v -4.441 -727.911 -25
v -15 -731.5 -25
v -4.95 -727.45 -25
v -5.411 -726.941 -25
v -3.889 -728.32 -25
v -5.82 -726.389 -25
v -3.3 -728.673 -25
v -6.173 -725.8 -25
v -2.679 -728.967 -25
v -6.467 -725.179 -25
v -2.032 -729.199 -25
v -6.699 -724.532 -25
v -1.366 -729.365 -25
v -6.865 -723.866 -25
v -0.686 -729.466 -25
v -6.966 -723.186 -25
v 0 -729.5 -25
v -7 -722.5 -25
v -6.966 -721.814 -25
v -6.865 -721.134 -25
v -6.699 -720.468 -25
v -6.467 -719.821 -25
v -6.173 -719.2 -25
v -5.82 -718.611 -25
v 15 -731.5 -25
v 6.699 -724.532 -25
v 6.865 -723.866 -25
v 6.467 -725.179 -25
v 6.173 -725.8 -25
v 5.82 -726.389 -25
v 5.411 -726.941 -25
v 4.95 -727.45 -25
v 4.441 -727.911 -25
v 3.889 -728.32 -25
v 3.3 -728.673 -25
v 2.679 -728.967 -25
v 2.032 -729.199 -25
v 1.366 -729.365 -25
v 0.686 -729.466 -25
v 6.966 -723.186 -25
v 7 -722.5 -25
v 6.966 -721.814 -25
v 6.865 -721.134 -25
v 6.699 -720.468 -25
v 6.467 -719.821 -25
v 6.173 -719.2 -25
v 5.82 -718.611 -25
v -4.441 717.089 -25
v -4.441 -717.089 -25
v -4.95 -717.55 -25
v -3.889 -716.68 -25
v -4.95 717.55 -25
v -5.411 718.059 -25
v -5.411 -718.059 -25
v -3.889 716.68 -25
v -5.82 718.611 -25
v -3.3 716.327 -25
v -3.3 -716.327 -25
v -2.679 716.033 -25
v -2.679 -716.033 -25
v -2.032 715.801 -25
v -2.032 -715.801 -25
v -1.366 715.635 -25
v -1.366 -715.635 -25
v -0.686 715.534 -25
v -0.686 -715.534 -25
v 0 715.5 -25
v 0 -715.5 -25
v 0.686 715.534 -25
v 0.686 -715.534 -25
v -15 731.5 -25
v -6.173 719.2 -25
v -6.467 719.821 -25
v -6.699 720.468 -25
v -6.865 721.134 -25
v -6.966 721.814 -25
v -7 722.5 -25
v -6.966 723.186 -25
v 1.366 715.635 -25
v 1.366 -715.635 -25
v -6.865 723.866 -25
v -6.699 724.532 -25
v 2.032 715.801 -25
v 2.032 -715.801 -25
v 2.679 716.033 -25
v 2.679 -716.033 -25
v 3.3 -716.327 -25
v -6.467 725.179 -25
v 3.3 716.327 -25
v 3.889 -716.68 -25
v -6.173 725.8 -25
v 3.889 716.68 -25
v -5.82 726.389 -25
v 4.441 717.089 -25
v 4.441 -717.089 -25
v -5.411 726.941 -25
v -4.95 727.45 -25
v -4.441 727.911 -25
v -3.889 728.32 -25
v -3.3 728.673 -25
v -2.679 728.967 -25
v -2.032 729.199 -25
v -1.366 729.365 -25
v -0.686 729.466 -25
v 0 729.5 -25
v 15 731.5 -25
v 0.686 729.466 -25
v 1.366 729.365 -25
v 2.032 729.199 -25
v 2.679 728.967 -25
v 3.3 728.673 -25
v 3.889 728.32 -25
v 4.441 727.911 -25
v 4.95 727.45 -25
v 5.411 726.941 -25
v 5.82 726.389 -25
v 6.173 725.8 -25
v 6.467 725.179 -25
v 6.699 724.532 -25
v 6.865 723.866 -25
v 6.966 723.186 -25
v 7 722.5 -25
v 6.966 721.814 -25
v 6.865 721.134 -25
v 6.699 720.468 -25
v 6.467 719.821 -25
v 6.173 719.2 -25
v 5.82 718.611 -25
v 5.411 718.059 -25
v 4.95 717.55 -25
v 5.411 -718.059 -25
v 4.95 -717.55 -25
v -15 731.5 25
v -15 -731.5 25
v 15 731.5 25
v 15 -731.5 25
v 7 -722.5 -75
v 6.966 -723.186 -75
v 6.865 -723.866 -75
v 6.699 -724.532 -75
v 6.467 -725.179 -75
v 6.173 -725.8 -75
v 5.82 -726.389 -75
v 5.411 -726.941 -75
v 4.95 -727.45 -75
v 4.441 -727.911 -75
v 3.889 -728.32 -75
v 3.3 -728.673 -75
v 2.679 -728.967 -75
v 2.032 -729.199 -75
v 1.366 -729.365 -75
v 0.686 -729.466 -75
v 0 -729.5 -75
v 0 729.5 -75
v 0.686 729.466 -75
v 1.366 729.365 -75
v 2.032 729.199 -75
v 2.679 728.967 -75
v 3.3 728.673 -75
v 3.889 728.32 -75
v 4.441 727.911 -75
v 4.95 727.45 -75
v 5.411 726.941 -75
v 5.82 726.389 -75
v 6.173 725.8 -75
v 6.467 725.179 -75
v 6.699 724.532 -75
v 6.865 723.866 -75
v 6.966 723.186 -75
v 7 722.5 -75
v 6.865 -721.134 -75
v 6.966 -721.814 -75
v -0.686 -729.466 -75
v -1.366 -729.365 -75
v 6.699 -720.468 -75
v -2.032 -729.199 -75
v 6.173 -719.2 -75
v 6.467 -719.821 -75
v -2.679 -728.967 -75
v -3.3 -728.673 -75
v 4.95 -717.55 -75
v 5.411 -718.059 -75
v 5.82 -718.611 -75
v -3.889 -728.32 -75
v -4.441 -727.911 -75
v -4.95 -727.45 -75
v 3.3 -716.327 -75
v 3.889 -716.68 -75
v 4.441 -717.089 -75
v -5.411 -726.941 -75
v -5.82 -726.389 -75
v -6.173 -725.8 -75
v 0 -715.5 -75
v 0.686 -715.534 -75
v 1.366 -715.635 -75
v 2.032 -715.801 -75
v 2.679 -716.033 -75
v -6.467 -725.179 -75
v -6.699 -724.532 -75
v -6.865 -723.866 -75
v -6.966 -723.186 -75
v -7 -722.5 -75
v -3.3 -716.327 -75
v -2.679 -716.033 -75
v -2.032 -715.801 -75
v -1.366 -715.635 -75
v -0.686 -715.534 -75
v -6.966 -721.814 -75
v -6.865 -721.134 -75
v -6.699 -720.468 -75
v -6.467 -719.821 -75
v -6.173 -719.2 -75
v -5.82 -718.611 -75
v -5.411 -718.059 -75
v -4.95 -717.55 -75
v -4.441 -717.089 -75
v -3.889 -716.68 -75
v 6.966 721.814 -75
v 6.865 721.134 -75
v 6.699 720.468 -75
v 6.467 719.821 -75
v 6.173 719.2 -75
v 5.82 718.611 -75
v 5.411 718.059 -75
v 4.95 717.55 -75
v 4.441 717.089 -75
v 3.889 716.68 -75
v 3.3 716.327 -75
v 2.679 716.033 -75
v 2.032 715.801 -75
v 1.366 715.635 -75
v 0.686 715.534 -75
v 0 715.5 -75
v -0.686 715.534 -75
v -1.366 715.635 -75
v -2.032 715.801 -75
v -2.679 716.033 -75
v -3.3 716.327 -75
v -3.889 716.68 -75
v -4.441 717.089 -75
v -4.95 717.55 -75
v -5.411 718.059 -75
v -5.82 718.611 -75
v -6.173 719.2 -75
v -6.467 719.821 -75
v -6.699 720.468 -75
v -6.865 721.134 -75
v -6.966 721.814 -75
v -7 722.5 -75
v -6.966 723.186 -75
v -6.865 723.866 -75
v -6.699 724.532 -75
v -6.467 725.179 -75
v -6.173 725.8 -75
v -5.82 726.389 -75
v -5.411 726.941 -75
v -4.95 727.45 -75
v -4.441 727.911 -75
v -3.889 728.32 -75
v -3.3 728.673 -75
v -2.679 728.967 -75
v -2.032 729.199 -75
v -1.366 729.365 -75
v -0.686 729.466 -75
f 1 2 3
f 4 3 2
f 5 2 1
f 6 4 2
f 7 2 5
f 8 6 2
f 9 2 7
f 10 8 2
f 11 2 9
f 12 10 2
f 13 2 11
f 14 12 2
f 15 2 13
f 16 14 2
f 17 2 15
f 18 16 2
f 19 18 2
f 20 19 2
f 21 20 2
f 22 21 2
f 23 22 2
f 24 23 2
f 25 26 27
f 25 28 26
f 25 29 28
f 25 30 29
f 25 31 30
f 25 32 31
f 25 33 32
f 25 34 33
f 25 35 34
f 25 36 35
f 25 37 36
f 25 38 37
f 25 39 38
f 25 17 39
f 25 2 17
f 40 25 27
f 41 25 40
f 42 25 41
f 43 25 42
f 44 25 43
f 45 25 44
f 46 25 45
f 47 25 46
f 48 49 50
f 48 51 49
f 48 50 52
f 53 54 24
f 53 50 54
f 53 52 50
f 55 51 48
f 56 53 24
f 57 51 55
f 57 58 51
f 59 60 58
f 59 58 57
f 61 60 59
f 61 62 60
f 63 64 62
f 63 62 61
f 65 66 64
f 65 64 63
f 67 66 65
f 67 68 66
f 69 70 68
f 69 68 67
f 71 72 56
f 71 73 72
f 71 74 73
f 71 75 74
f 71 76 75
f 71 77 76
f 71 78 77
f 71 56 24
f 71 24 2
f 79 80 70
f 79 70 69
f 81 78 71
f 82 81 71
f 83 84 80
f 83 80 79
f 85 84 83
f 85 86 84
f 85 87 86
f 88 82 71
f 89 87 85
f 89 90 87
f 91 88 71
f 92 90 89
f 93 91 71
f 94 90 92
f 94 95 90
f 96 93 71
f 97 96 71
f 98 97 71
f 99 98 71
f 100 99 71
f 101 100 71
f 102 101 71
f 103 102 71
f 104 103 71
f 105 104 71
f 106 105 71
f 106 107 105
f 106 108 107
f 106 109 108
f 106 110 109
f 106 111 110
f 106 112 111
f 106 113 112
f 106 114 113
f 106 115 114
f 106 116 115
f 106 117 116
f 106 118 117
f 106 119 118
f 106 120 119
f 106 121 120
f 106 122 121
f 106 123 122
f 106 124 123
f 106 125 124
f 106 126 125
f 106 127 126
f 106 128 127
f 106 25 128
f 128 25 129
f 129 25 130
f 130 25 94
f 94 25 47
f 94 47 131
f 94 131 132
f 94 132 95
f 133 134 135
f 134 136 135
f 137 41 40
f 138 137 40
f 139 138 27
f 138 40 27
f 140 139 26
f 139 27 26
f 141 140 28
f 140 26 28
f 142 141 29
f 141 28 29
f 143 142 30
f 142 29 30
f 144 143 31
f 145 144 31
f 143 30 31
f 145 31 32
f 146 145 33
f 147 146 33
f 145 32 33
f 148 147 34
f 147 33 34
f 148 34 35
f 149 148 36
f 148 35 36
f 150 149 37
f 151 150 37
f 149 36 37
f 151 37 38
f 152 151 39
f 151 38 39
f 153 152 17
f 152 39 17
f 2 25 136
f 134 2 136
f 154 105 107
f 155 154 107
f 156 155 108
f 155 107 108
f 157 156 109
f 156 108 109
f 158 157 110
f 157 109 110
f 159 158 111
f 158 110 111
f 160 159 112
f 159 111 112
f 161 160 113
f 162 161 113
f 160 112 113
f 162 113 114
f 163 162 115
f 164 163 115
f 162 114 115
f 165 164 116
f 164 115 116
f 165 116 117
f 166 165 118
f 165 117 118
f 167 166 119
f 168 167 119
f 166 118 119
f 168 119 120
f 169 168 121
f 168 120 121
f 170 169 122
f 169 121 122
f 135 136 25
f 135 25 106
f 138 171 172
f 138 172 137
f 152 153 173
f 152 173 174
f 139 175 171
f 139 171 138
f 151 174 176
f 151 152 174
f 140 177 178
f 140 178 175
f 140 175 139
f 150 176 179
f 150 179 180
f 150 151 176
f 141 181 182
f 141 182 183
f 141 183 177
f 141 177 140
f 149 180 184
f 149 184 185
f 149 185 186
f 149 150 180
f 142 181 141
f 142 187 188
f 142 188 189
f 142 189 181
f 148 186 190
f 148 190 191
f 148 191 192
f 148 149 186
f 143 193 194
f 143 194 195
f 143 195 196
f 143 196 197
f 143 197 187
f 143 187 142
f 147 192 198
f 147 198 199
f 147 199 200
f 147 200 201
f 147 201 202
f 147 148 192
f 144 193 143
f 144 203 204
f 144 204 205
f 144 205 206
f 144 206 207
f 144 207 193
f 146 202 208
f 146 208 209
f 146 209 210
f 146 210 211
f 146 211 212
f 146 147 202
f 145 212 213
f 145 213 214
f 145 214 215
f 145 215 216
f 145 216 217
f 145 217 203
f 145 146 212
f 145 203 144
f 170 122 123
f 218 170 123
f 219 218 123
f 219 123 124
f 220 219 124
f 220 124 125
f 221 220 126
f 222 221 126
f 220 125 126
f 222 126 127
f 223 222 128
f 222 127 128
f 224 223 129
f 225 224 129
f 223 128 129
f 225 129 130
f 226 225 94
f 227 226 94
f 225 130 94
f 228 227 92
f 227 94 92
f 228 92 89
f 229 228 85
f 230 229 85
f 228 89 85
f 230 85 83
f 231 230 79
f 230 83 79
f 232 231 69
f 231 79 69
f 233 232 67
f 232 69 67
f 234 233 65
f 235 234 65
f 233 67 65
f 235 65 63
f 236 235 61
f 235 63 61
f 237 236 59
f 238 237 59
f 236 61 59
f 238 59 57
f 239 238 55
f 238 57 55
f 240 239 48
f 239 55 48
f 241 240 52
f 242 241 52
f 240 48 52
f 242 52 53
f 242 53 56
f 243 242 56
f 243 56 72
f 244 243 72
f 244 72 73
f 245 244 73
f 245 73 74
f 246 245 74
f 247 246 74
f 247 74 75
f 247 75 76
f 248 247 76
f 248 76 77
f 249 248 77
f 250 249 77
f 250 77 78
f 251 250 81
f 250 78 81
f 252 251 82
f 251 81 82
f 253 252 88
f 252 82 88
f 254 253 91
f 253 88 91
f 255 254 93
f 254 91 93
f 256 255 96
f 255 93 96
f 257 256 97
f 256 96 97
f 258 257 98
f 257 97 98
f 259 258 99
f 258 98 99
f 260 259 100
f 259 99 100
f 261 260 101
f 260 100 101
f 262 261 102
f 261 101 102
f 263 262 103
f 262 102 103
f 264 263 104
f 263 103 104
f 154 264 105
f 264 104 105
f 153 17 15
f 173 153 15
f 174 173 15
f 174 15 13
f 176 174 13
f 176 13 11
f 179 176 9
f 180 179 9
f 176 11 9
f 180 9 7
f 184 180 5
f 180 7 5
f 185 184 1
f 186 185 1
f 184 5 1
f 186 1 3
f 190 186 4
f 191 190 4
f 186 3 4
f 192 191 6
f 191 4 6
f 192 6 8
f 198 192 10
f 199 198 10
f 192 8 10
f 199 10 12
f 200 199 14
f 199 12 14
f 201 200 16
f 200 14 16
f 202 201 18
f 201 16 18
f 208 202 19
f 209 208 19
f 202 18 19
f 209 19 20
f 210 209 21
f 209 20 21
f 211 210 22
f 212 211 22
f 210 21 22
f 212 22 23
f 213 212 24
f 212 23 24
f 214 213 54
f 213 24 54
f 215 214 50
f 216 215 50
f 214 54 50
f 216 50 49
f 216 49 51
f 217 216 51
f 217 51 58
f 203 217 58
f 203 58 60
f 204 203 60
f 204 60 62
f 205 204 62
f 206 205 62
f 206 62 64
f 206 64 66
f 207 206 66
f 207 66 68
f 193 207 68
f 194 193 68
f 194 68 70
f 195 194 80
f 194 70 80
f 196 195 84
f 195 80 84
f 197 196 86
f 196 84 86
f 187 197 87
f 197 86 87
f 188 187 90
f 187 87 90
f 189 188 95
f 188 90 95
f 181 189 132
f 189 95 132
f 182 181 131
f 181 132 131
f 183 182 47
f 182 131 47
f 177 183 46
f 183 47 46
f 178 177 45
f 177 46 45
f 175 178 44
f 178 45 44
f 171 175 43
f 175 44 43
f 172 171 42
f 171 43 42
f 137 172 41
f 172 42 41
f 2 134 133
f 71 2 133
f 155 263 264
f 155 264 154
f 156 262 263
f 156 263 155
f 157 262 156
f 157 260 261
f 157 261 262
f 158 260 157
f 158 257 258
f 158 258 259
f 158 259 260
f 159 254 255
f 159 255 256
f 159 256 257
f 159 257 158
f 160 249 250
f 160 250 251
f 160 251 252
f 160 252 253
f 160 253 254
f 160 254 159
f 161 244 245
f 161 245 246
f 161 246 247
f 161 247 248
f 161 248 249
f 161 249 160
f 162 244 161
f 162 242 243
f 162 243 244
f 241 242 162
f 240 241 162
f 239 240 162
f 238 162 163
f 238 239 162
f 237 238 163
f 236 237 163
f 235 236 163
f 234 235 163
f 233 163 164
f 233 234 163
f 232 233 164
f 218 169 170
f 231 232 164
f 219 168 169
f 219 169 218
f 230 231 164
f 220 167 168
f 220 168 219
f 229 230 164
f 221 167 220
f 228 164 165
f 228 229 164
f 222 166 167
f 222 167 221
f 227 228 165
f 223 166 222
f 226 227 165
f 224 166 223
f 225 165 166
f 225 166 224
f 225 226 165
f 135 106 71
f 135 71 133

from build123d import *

# Parameters (mm, degrees)
F0_W          = 1463
F0_H          = 50
F1_DEPTH      = 15
F1_DEPTH_BACK = 15
F3_DEPTH      = 50
F5_DEPTH      = 50


with BuildPart() as f1:
    # F0 (on Right) → F1 (new body, two sides)
    with BuildSketch(Plane.YZ) as f1_sk:
        Rectangle(F0_W, F0_H)
    extrude(amount=F1_DEPTH)
    extrude(f1_sk.sketch, amount=-F1_DEPTH_BACK)

    # F2 (on face) → F3 (join)
    with BuildSketch(Plane(origin=(0, 0, -25), x_dir=(1, 0, 0), z_dir=(0, 0, -1))):
        with BuildLine():
            ThreePointArc((0, 729.5), (-4.949747, 717.550253), (7, 722.5))
            ThreePointArc((7, 722.5), (4.949747, 727.449747), (0, 729.5))
        make_face()
    extrude(amount=F3_DEPTH)

    # F4 (on face) → F5 (join)
    with BuildSketch(Plane(origin=(0, 0, -25), x_dir=(1, 0, 0), z_dir=(0, 0, -1))):
        with BuildLine():
            ThreePointArc((0, -729.5), (4.949747, -727.449747), (7, -722.5))
            ThreePointArc((7, -722.5), (-4.949747, -717.550253), (0, -729.5))
        make_face()
    extrude(amount=F5_DEPTH)


solid = f1.part
